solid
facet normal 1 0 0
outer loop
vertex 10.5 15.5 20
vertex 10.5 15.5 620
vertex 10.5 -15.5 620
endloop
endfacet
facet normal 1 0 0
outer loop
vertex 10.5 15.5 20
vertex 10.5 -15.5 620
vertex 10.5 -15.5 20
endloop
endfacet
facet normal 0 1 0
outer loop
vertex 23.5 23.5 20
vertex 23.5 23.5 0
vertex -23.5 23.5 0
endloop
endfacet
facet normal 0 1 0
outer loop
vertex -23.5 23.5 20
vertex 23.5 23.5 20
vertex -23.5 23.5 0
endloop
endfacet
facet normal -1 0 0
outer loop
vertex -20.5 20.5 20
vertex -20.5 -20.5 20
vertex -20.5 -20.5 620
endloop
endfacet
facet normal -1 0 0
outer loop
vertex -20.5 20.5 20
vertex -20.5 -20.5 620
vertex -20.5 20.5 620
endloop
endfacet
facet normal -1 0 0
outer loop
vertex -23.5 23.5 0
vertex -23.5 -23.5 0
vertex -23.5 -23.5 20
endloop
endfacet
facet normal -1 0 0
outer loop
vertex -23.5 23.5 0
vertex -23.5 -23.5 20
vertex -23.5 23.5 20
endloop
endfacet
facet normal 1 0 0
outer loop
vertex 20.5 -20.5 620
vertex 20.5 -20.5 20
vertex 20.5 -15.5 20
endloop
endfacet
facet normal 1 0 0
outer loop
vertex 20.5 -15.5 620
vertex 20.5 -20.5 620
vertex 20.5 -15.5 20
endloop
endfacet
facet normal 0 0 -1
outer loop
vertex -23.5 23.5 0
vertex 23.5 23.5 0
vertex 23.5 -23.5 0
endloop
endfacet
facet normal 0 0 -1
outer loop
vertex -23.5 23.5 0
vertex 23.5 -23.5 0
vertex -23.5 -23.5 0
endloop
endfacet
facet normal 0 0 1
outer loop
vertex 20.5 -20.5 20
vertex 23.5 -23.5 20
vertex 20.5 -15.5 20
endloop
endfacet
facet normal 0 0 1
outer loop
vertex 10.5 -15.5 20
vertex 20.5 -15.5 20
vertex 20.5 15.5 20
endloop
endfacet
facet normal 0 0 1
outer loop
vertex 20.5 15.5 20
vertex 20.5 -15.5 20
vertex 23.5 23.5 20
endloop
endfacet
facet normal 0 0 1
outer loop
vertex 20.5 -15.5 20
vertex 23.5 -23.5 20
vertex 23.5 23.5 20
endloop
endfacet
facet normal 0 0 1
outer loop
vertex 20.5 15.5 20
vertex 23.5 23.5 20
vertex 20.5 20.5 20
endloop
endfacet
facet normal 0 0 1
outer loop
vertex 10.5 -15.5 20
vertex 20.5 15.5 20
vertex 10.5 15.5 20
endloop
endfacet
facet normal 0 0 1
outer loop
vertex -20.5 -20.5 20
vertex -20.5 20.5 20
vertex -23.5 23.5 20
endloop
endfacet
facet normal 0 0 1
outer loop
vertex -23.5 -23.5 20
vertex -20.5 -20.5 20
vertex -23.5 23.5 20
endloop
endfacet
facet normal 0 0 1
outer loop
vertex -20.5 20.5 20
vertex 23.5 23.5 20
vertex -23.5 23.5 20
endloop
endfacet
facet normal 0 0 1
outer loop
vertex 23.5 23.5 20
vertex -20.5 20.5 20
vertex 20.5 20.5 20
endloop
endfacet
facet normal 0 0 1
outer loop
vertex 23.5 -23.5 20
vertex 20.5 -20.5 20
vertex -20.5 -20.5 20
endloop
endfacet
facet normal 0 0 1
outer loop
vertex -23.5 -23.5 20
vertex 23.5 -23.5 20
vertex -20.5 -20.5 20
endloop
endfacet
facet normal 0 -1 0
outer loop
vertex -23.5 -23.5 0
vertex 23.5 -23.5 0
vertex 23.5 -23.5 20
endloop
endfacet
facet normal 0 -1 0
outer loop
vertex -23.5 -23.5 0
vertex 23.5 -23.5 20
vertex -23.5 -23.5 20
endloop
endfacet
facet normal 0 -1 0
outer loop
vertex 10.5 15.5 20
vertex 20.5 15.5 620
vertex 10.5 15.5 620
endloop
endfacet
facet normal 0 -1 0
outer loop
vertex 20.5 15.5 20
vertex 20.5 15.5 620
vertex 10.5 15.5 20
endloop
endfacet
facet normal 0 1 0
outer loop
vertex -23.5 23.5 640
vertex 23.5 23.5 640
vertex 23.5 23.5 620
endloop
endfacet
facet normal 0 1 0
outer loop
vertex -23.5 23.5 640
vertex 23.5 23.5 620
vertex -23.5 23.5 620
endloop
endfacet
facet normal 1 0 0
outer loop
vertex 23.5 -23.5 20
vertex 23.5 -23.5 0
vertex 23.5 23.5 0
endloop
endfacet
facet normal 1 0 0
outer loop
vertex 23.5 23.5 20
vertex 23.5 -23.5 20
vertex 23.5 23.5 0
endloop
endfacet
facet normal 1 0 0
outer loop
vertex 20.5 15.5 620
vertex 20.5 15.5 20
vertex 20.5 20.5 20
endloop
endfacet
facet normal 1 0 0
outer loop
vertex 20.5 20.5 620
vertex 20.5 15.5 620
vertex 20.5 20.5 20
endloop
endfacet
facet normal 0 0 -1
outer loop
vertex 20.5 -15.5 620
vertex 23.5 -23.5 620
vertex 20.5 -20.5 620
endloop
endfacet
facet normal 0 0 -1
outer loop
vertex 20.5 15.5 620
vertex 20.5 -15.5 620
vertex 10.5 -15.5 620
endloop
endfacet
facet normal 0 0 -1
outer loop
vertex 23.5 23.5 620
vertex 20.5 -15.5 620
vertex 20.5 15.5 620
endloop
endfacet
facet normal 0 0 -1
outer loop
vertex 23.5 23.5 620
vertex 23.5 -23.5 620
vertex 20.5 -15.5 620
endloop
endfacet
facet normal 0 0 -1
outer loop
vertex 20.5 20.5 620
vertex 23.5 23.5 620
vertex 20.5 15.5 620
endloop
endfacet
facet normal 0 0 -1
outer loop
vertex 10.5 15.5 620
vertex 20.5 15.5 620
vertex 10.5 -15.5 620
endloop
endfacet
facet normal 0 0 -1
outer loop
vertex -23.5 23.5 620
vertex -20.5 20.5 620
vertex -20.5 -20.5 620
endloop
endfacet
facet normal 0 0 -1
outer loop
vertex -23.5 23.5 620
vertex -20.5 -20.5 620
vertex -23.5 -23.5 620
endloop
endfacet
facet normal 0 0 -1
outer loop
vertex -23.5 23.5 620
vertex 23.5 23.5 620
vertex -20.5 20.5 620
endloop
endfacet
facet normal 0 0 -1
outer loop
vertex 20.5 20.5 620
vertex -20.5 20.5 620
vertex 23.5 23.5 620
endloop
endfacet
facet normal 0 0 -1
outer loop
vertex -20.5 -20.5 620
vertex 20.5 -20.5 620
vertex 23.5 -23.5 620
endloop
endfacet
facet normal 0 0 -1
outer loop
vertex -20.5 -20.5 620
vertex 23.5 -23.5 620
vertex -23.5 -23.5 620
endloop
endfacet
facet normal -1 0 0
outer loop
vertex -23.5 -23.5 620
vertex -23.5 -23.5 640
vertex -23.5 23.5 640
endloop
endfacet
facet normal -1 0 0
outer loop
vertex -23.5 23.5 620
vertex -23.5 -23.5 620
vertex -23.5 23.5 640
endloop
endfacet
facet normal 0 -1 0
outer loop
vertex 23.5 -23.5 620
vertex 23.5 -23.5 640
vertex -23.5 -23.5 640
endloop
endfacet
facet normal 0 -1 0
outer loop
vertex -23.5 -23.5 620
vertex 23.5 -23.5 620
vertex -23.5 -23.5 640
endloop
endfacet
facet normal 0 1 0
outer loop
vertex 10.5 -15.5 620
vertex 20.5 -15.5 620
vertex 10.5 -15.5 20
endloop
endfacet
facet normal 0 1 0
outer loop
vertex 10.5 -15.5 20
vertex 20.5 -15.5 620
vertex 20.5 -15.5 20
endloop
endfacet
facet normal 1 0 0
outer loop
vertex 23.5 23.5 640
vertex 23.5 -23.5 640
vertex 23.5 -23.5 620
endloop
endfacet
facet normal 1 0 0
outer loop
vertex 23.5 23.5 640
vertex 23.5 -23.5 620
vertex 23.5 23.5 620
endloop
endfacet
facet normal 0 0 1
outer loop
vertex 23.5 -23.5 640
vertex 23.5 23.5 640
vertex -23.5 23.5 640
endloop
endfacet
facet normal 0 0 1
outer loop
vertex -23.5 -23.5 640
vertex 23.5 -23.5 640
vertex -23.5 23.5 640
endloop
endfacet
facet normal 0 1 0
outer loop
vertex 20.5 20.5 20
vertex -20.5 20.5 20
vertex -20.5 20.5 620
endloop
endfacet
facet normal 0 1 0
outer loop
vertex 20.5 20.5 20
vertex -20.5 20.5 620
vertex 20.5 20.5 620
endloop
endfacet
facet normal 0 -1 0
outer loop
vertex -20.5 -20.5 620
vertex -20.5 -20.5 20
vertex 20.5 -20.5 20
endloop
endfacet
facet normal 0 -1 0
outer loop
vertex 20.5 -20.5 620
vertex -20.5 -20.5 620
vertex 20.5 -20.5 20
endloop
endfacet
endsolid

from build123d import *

# Parameters (mm, degrees)
SKETCH1_W           = 41
SKETCH1_H           = 41
BOSS_EXTRUDE1_DEPTH = 640
SKETCH2_W           = 47
SKETCH2_H           = 47
BOSS_EXTRUDE2_DEPTH = 20
SKETCH3_W           = 600
SKETCH3_H           = 31
CUT_EXTRUDE1_DEPTH  = 10


with BuildPart() as part:
    # Sketch1 → Boss-Extrude1 (new body)
    with BuildSketch(Plane.XY):
        Rectangle(SKETCH1_W, SKETCH1_H)
    extrude(amount=BOSS_EXTRUDE1_DEPTH)

    # Sketch2 → Boss-Extrude2 (add)
    with BuildSketch(Plane(origin=(0, 0, 0), x_dir=(-1, 0, 0), z_dir=(0, 0, -1))):
        Rectangle(SKETCH2_W, SKETCH2_H)
    boss_extrude2 = extrude(amount=-BOSS_EXTRUDE2_DEPTH)

    # Mirror1: Boss-Extrude2 across plane
    add(boss_extrude2.mirror(Plane(origin=(0, 0, 320), x_dir=(1, 0, 0), z_dir=(0, 0, -1))))

    # Sketch3 → Cut-Extrude1 (cut)
    with BuildSketch(Plane(origin=(20.5, 0, 0), x_dir=(0, 0, -1), z_dir=(1, 0, 0))):
        with Locations((-320, 0)):
            Rectangle(SKETCH3_W, SKETCH3_H)
    extrude(amount=-CUT_EXTRUDE1_DEPTH, mode=Mode.SUBTRACT)


solid = part.part
